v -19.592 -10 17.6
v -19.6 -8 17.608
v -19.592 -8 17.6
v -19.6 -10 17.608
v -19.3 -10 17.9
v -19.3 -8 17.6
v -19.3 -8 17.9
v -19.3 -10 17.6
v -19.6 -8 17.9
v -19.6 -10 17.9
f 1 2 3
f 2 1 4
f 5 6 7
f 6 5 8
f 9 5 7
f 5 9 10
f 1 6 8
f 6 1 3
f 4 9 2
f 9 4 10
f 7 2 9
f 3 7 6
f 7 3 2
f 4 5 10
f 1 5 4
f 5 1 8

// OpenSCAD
// Printability: the Z column overhangs the x-slider block by
// (col_w - xs_len) / 2 on each X side. A 45 deg support must fill under
// the overhang: material just below the column, near its outer edge, on
// the -X side. Must render non-empty.
include <../stage.scad>
intersection() {
    stage_x_slider();
    translate([xs_xc + (-1) * (col_w / 2 - 0.55) - 0.15, (col_y0 + col_y1) / 2 - 1, xs_top - 0.4]) cube([0.3, 2, 0.3]);
}
